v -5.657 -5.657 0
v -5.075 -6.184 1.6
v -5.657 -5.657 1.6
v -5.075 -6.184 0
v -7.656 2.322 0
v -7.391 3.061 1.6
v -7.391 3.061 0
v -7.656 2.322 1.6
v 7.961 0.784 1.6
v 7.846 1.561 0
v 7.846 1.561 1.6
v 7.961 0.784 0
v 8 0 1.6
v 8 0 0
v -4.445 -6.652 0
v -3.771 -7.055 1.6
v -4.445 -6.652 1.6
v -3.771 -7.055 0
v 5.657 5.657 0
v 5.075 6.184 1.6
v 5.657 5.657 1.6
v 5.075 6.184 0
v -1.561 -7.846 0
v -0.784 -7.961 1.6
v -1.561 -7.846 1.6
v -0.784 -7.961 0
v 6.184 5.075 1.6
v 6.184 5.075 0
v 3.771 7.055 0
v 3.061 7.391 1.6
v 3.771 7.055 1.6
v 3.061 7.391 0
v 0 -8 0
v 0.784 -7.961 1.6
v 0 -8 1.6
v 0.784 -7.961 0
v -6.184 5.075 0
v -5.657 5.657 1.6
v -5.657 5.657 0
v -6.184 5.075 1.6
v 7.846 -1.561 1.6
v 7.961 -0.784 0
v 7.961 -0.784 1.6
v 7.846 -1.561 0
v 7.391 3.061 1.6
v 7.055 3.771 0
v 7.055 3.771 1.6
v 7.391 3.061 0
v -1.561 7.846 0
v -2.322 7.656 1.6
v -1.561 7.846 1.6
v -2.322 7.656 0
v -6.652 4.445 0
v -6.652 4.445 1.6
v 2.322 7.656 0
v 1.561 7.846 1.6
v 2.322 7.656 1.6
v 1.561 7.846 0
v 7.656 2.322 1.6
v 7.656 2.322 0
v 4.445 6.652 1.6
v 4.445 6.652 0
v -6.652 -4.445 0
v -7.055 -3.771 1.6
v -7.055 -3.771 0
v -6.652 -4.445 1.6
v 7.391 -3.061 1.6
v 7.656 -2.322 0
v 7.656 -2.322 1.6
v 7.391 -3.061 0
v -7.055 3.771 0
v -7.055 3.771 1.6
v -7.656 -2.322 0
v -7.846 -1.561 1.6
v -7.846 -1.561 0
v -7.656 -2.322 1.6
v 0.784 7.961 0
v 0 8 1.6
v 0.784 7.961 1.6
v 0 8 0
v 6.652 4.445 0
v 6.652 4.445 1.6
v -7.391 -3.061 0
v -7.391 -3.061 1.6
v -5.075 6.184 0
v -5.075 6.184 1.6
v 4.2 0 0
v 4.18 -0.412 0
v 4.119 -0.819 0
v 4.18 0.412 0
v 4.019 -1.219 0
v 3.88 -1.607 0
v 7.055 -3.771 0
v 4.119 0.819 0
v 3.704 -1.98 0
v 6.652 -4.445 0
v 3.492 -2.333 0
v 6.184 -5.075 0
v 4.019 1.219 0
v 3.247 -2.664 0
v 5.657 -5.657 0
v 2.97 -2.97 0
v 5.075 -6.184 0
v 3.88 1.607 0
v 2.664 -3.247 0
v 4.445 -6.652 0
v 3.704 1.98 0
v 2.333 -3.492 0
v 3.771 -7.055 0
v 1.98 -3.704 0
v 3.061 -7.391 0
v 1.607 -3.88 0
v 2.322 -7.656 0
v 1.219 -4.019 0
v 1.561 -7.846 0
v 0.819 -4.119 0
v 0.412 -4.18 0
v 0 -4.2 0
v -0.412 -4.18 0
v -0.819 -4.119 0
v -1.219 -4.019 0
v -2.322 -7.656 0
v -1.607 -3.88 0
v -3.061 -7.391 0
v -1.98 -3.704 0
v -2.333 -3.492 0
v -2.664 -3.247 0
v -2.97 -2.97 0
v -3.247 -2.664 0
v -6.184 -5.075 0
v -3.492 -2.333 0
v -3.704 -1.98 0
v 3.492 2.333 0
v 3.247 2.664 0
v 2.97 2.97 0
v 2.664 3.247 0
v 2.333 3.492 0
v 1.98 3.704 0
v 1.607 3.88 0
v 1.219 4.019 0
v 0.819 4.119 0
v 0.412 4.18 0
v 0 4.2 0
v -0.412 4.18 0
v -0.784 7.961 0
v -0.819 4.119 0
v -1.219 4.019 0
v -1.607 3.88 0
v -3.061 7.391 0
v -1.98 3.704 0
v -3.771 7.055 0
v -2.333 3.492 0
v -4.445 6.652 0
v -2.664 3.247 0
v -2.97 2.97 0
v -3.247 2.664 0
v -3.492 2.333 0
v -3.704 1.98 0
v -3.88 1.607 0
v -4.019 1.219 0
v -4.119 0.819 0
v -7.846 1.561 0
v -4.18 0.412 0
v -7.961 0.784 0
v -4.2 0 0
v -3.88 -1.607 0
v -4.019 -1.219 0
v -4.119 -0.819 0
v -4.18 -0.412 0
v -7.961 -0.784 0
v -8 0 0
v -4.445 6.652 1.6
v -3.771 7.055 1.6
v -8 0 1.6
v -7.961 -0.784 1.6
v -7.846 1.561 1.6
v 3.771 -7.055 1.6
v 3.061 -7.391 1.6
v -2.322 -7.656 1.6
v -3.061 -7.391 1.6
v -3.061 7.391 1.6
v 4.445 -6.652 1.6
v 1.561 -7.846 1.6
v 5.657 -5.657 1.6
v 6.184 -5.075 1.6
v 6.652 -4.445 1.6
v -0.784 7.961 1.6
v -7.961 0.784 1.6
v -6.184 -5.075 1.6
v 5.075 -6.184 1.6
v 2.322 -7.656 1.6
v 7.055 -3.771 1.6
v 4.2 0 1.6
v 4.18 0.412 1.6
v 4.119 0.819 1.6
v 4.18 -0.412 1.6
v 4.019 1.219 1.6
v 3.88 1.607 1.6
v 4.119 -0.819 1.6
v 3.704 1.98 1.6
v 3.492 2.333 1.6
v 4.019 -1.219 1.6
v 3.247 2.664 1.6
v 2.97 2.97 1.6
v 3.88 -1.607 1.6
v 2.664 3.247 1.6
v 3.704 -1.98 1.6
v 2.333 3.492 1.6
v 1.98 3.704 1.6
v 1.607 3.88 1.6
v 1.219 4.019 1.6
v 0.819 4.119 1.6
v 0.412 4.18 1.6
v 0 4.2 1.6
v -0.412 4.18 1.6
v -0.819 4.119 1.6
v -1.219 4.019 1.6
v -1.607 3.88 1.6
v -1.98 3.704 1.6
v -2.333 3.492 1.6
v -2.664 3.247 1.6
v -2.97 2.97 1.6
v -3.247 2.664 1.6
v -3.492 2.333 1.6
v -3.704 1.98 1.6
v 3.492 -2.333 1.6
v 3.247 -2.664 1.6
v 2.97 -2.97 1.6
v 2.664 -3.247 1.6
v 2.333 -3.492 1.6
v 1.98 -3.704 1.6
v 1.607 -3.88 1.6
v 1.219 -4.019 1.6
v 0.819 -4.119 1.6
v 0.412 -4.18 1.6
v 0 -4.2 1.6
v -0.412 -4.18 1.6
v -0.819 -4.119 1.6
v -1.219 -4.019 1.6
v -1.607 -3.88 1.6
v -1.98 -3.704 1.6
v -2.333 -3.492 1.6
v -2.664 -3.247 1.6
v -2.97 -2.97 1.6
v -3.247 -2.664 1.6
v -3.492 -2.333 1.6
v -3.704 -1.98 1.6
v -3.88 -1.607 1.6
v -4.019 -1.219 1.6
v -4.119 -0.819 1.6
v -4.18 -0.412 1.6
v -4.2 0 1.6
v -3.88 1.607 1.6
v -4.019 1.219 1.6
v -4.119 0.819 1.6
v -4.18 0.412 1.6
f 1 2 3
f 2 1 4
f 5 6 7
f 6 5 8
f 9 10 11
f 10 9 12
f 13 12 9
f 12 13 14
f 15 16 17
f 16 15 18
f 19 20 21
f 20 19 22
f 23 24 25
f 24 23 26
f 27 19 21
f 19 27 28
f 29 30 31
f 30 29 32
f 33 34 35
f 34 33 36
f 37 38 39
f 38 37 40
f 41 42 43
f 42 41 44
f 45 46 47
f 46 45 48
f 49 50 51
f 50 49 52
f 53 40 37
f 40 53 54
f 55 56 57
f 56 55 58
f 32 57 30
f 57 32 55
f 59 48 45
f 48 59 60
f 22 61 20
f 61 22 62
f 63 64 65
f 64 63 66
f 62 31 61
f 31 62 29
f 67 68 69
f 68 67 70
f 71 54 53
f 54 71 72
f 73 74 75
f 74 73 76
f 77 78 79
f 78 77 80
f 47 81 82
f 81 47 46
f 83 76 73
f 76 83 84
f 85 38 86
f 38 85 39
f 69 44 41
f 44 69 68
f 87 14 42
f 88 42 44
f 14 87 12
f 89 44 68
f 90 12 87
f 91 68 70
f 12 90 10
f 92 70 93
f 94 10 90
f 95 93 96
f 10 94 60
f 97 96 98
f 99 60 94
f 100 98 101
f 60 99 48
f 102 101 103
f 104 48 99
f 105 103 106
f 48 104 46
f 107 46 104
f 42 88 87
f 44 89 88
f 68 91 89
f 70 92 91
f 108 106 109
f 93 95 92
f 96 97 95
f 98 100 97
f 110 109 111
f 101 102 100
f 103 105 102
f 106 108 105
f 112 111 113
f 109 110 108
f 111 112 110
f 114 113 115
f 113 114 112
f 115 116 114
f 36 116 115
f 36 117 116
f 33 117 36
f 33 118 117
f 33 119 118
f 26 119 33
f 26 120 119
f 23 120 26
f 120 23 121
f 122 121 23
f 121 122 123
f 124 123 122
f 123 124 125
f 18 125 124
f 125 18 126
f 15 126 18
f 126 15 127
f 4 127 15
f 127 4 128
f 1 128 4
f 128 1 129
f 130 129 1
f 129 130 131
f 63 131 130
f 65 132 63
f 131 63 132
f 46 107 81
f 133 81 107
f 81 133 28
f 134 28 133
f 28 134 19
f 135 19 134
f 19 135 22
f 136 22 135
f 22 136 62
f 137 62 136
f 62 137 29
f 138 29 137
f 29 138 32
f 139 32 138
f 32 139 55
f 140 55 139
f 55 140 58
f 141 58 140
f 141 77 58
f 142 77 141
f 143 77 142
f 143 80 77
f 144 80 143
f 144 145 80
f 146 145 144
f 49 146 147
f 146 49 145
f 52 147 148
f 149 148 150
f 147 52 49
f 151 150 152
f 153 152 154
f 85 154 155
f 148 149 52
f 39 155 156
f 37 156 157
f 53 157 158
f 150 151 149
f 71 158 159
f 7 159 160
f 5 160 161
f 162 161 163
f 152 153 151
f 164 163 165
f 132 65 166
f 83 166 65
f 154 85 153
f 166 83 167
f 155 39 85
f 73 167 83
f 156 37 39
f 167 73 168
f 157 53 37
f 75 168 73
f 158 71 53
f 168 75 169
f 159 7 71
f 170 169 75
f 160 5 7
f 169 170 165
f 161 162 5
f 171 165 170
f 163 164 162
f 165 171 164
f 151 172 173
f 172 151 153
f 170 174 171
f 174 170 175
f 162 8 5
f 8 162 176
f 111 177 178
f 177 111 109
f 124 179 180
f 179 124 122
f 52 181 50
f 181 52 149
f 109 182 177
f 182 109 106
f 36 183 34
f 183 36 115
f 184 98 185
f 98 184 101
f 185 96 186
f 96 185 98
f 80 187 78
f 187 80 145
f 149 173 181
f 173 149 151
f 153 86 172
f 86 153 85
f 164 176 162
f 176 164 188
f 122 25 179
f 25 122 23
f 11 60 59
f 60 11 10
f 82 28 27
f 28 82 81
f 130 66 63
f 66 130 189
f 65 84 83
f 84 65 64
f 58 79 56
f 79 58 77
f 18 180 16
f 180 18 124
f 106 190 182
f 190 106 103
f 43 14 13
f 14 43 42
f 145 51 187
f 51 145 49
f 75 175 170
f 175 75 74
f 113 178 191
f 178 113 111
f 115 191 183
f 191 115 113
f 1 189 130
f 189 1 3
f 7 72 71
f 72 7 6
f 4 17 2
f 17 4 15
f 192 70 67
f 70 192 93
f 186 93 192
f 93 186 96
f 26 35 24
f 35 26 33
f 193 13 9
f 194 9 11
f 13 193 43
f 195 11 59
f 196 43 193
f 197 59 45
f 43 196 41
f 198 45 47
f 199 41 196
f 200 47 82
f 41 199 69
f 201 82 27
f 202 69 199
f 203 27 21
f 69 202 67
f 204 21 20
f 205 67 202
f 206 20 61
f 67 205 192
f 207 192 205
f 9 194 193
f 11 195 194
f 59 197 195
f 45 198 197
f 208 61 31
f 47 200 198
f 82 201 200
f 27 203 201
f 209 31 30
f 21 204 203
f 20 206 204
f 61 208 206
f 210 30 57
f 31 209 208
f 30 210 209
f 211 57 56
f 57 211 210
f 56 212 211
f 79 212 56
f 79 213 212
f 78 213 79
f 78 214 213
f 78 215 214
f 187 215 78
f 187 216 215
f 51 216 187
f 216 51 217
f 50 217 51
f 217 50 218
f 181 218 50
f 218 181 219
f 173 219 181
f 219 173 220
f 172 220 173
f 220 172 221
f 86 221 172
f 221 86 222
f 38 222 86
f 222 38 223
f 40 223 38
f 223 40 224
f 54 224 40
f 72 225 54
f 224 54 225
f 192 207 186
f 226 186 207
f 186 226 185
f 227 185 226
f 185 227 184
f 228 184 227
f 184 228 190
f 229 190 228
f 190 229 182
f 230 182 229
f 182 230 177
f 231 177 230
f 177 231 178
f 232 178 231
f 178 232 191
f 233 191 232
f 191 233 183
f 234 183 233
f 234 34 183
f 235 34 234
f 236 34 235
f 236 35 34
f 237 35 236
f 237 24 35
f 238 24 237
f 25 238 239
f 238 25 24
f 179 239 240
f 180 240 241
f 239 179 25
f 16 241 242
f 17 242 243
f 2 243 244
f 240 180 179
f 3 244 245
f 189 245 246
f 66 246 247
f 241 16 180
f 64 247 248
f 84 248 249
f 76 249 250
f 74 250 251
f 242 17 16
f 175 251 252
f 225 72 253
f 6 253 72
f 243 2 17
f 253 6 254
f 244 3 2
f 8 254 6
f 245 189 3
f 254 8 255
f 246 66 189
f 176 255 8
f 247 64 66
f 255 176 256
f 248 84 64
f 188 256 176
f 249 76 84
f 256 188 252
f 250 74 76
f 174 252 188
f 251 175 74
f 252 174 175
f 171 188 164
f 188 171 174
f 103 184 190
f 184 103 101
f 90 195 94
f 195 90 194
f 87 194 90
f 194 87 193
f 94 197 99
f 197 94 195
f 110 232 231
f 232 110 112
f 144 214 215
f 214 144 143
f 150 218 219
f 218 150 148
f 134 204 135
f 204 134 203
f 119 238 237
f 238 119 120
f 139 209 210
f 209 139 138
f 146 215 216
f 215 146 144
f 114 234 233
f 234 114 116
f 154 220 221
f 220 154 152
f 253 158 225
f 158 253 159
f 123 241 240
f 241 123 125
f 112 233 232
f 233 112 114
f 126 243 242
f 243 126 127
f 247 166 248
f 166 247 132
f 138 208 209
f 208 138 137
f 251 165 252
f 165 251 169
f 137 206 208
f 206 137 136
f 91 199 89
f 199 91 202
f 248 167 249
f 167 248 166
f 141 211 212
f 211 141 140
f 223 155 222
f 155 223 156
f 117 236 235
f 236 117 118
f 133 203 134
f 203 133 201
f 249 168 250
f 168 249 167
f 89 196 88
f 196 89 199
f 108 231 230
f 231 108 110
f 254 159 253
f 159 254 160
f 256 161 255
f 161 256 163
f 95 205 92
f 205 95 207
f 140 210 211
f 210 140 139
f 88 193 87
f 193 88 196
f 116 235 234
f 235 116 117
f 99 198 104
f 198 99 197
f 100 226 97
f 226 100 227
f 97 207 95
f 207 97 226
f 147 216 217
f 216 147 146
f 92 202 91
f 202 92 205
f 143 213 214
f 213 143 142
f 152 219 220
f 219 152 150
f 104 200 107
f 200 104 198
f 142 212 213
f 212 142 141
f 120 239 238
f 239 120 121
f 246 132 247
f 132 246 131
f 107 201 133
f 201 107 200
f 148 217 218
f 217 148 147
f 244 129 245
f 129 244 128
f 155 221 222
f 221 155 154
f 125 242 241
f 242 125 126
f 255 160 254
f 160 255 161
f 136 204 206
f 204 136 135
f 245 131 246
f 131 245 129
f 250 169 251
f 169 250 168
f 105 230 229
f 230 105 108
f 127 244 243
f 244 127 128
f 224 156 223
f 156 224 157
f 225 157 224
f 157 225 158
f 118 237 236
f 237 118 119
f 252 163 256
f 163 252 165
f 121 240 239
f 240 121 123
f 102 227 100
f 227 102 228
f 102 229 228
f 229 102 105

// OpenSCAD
difference() {
    cylinder(h=1.6, d=16, $fn=64);
    translate([0, 0, -0.1])
        cylinder(h=1.8, d=8.4, $fn=64);
}
